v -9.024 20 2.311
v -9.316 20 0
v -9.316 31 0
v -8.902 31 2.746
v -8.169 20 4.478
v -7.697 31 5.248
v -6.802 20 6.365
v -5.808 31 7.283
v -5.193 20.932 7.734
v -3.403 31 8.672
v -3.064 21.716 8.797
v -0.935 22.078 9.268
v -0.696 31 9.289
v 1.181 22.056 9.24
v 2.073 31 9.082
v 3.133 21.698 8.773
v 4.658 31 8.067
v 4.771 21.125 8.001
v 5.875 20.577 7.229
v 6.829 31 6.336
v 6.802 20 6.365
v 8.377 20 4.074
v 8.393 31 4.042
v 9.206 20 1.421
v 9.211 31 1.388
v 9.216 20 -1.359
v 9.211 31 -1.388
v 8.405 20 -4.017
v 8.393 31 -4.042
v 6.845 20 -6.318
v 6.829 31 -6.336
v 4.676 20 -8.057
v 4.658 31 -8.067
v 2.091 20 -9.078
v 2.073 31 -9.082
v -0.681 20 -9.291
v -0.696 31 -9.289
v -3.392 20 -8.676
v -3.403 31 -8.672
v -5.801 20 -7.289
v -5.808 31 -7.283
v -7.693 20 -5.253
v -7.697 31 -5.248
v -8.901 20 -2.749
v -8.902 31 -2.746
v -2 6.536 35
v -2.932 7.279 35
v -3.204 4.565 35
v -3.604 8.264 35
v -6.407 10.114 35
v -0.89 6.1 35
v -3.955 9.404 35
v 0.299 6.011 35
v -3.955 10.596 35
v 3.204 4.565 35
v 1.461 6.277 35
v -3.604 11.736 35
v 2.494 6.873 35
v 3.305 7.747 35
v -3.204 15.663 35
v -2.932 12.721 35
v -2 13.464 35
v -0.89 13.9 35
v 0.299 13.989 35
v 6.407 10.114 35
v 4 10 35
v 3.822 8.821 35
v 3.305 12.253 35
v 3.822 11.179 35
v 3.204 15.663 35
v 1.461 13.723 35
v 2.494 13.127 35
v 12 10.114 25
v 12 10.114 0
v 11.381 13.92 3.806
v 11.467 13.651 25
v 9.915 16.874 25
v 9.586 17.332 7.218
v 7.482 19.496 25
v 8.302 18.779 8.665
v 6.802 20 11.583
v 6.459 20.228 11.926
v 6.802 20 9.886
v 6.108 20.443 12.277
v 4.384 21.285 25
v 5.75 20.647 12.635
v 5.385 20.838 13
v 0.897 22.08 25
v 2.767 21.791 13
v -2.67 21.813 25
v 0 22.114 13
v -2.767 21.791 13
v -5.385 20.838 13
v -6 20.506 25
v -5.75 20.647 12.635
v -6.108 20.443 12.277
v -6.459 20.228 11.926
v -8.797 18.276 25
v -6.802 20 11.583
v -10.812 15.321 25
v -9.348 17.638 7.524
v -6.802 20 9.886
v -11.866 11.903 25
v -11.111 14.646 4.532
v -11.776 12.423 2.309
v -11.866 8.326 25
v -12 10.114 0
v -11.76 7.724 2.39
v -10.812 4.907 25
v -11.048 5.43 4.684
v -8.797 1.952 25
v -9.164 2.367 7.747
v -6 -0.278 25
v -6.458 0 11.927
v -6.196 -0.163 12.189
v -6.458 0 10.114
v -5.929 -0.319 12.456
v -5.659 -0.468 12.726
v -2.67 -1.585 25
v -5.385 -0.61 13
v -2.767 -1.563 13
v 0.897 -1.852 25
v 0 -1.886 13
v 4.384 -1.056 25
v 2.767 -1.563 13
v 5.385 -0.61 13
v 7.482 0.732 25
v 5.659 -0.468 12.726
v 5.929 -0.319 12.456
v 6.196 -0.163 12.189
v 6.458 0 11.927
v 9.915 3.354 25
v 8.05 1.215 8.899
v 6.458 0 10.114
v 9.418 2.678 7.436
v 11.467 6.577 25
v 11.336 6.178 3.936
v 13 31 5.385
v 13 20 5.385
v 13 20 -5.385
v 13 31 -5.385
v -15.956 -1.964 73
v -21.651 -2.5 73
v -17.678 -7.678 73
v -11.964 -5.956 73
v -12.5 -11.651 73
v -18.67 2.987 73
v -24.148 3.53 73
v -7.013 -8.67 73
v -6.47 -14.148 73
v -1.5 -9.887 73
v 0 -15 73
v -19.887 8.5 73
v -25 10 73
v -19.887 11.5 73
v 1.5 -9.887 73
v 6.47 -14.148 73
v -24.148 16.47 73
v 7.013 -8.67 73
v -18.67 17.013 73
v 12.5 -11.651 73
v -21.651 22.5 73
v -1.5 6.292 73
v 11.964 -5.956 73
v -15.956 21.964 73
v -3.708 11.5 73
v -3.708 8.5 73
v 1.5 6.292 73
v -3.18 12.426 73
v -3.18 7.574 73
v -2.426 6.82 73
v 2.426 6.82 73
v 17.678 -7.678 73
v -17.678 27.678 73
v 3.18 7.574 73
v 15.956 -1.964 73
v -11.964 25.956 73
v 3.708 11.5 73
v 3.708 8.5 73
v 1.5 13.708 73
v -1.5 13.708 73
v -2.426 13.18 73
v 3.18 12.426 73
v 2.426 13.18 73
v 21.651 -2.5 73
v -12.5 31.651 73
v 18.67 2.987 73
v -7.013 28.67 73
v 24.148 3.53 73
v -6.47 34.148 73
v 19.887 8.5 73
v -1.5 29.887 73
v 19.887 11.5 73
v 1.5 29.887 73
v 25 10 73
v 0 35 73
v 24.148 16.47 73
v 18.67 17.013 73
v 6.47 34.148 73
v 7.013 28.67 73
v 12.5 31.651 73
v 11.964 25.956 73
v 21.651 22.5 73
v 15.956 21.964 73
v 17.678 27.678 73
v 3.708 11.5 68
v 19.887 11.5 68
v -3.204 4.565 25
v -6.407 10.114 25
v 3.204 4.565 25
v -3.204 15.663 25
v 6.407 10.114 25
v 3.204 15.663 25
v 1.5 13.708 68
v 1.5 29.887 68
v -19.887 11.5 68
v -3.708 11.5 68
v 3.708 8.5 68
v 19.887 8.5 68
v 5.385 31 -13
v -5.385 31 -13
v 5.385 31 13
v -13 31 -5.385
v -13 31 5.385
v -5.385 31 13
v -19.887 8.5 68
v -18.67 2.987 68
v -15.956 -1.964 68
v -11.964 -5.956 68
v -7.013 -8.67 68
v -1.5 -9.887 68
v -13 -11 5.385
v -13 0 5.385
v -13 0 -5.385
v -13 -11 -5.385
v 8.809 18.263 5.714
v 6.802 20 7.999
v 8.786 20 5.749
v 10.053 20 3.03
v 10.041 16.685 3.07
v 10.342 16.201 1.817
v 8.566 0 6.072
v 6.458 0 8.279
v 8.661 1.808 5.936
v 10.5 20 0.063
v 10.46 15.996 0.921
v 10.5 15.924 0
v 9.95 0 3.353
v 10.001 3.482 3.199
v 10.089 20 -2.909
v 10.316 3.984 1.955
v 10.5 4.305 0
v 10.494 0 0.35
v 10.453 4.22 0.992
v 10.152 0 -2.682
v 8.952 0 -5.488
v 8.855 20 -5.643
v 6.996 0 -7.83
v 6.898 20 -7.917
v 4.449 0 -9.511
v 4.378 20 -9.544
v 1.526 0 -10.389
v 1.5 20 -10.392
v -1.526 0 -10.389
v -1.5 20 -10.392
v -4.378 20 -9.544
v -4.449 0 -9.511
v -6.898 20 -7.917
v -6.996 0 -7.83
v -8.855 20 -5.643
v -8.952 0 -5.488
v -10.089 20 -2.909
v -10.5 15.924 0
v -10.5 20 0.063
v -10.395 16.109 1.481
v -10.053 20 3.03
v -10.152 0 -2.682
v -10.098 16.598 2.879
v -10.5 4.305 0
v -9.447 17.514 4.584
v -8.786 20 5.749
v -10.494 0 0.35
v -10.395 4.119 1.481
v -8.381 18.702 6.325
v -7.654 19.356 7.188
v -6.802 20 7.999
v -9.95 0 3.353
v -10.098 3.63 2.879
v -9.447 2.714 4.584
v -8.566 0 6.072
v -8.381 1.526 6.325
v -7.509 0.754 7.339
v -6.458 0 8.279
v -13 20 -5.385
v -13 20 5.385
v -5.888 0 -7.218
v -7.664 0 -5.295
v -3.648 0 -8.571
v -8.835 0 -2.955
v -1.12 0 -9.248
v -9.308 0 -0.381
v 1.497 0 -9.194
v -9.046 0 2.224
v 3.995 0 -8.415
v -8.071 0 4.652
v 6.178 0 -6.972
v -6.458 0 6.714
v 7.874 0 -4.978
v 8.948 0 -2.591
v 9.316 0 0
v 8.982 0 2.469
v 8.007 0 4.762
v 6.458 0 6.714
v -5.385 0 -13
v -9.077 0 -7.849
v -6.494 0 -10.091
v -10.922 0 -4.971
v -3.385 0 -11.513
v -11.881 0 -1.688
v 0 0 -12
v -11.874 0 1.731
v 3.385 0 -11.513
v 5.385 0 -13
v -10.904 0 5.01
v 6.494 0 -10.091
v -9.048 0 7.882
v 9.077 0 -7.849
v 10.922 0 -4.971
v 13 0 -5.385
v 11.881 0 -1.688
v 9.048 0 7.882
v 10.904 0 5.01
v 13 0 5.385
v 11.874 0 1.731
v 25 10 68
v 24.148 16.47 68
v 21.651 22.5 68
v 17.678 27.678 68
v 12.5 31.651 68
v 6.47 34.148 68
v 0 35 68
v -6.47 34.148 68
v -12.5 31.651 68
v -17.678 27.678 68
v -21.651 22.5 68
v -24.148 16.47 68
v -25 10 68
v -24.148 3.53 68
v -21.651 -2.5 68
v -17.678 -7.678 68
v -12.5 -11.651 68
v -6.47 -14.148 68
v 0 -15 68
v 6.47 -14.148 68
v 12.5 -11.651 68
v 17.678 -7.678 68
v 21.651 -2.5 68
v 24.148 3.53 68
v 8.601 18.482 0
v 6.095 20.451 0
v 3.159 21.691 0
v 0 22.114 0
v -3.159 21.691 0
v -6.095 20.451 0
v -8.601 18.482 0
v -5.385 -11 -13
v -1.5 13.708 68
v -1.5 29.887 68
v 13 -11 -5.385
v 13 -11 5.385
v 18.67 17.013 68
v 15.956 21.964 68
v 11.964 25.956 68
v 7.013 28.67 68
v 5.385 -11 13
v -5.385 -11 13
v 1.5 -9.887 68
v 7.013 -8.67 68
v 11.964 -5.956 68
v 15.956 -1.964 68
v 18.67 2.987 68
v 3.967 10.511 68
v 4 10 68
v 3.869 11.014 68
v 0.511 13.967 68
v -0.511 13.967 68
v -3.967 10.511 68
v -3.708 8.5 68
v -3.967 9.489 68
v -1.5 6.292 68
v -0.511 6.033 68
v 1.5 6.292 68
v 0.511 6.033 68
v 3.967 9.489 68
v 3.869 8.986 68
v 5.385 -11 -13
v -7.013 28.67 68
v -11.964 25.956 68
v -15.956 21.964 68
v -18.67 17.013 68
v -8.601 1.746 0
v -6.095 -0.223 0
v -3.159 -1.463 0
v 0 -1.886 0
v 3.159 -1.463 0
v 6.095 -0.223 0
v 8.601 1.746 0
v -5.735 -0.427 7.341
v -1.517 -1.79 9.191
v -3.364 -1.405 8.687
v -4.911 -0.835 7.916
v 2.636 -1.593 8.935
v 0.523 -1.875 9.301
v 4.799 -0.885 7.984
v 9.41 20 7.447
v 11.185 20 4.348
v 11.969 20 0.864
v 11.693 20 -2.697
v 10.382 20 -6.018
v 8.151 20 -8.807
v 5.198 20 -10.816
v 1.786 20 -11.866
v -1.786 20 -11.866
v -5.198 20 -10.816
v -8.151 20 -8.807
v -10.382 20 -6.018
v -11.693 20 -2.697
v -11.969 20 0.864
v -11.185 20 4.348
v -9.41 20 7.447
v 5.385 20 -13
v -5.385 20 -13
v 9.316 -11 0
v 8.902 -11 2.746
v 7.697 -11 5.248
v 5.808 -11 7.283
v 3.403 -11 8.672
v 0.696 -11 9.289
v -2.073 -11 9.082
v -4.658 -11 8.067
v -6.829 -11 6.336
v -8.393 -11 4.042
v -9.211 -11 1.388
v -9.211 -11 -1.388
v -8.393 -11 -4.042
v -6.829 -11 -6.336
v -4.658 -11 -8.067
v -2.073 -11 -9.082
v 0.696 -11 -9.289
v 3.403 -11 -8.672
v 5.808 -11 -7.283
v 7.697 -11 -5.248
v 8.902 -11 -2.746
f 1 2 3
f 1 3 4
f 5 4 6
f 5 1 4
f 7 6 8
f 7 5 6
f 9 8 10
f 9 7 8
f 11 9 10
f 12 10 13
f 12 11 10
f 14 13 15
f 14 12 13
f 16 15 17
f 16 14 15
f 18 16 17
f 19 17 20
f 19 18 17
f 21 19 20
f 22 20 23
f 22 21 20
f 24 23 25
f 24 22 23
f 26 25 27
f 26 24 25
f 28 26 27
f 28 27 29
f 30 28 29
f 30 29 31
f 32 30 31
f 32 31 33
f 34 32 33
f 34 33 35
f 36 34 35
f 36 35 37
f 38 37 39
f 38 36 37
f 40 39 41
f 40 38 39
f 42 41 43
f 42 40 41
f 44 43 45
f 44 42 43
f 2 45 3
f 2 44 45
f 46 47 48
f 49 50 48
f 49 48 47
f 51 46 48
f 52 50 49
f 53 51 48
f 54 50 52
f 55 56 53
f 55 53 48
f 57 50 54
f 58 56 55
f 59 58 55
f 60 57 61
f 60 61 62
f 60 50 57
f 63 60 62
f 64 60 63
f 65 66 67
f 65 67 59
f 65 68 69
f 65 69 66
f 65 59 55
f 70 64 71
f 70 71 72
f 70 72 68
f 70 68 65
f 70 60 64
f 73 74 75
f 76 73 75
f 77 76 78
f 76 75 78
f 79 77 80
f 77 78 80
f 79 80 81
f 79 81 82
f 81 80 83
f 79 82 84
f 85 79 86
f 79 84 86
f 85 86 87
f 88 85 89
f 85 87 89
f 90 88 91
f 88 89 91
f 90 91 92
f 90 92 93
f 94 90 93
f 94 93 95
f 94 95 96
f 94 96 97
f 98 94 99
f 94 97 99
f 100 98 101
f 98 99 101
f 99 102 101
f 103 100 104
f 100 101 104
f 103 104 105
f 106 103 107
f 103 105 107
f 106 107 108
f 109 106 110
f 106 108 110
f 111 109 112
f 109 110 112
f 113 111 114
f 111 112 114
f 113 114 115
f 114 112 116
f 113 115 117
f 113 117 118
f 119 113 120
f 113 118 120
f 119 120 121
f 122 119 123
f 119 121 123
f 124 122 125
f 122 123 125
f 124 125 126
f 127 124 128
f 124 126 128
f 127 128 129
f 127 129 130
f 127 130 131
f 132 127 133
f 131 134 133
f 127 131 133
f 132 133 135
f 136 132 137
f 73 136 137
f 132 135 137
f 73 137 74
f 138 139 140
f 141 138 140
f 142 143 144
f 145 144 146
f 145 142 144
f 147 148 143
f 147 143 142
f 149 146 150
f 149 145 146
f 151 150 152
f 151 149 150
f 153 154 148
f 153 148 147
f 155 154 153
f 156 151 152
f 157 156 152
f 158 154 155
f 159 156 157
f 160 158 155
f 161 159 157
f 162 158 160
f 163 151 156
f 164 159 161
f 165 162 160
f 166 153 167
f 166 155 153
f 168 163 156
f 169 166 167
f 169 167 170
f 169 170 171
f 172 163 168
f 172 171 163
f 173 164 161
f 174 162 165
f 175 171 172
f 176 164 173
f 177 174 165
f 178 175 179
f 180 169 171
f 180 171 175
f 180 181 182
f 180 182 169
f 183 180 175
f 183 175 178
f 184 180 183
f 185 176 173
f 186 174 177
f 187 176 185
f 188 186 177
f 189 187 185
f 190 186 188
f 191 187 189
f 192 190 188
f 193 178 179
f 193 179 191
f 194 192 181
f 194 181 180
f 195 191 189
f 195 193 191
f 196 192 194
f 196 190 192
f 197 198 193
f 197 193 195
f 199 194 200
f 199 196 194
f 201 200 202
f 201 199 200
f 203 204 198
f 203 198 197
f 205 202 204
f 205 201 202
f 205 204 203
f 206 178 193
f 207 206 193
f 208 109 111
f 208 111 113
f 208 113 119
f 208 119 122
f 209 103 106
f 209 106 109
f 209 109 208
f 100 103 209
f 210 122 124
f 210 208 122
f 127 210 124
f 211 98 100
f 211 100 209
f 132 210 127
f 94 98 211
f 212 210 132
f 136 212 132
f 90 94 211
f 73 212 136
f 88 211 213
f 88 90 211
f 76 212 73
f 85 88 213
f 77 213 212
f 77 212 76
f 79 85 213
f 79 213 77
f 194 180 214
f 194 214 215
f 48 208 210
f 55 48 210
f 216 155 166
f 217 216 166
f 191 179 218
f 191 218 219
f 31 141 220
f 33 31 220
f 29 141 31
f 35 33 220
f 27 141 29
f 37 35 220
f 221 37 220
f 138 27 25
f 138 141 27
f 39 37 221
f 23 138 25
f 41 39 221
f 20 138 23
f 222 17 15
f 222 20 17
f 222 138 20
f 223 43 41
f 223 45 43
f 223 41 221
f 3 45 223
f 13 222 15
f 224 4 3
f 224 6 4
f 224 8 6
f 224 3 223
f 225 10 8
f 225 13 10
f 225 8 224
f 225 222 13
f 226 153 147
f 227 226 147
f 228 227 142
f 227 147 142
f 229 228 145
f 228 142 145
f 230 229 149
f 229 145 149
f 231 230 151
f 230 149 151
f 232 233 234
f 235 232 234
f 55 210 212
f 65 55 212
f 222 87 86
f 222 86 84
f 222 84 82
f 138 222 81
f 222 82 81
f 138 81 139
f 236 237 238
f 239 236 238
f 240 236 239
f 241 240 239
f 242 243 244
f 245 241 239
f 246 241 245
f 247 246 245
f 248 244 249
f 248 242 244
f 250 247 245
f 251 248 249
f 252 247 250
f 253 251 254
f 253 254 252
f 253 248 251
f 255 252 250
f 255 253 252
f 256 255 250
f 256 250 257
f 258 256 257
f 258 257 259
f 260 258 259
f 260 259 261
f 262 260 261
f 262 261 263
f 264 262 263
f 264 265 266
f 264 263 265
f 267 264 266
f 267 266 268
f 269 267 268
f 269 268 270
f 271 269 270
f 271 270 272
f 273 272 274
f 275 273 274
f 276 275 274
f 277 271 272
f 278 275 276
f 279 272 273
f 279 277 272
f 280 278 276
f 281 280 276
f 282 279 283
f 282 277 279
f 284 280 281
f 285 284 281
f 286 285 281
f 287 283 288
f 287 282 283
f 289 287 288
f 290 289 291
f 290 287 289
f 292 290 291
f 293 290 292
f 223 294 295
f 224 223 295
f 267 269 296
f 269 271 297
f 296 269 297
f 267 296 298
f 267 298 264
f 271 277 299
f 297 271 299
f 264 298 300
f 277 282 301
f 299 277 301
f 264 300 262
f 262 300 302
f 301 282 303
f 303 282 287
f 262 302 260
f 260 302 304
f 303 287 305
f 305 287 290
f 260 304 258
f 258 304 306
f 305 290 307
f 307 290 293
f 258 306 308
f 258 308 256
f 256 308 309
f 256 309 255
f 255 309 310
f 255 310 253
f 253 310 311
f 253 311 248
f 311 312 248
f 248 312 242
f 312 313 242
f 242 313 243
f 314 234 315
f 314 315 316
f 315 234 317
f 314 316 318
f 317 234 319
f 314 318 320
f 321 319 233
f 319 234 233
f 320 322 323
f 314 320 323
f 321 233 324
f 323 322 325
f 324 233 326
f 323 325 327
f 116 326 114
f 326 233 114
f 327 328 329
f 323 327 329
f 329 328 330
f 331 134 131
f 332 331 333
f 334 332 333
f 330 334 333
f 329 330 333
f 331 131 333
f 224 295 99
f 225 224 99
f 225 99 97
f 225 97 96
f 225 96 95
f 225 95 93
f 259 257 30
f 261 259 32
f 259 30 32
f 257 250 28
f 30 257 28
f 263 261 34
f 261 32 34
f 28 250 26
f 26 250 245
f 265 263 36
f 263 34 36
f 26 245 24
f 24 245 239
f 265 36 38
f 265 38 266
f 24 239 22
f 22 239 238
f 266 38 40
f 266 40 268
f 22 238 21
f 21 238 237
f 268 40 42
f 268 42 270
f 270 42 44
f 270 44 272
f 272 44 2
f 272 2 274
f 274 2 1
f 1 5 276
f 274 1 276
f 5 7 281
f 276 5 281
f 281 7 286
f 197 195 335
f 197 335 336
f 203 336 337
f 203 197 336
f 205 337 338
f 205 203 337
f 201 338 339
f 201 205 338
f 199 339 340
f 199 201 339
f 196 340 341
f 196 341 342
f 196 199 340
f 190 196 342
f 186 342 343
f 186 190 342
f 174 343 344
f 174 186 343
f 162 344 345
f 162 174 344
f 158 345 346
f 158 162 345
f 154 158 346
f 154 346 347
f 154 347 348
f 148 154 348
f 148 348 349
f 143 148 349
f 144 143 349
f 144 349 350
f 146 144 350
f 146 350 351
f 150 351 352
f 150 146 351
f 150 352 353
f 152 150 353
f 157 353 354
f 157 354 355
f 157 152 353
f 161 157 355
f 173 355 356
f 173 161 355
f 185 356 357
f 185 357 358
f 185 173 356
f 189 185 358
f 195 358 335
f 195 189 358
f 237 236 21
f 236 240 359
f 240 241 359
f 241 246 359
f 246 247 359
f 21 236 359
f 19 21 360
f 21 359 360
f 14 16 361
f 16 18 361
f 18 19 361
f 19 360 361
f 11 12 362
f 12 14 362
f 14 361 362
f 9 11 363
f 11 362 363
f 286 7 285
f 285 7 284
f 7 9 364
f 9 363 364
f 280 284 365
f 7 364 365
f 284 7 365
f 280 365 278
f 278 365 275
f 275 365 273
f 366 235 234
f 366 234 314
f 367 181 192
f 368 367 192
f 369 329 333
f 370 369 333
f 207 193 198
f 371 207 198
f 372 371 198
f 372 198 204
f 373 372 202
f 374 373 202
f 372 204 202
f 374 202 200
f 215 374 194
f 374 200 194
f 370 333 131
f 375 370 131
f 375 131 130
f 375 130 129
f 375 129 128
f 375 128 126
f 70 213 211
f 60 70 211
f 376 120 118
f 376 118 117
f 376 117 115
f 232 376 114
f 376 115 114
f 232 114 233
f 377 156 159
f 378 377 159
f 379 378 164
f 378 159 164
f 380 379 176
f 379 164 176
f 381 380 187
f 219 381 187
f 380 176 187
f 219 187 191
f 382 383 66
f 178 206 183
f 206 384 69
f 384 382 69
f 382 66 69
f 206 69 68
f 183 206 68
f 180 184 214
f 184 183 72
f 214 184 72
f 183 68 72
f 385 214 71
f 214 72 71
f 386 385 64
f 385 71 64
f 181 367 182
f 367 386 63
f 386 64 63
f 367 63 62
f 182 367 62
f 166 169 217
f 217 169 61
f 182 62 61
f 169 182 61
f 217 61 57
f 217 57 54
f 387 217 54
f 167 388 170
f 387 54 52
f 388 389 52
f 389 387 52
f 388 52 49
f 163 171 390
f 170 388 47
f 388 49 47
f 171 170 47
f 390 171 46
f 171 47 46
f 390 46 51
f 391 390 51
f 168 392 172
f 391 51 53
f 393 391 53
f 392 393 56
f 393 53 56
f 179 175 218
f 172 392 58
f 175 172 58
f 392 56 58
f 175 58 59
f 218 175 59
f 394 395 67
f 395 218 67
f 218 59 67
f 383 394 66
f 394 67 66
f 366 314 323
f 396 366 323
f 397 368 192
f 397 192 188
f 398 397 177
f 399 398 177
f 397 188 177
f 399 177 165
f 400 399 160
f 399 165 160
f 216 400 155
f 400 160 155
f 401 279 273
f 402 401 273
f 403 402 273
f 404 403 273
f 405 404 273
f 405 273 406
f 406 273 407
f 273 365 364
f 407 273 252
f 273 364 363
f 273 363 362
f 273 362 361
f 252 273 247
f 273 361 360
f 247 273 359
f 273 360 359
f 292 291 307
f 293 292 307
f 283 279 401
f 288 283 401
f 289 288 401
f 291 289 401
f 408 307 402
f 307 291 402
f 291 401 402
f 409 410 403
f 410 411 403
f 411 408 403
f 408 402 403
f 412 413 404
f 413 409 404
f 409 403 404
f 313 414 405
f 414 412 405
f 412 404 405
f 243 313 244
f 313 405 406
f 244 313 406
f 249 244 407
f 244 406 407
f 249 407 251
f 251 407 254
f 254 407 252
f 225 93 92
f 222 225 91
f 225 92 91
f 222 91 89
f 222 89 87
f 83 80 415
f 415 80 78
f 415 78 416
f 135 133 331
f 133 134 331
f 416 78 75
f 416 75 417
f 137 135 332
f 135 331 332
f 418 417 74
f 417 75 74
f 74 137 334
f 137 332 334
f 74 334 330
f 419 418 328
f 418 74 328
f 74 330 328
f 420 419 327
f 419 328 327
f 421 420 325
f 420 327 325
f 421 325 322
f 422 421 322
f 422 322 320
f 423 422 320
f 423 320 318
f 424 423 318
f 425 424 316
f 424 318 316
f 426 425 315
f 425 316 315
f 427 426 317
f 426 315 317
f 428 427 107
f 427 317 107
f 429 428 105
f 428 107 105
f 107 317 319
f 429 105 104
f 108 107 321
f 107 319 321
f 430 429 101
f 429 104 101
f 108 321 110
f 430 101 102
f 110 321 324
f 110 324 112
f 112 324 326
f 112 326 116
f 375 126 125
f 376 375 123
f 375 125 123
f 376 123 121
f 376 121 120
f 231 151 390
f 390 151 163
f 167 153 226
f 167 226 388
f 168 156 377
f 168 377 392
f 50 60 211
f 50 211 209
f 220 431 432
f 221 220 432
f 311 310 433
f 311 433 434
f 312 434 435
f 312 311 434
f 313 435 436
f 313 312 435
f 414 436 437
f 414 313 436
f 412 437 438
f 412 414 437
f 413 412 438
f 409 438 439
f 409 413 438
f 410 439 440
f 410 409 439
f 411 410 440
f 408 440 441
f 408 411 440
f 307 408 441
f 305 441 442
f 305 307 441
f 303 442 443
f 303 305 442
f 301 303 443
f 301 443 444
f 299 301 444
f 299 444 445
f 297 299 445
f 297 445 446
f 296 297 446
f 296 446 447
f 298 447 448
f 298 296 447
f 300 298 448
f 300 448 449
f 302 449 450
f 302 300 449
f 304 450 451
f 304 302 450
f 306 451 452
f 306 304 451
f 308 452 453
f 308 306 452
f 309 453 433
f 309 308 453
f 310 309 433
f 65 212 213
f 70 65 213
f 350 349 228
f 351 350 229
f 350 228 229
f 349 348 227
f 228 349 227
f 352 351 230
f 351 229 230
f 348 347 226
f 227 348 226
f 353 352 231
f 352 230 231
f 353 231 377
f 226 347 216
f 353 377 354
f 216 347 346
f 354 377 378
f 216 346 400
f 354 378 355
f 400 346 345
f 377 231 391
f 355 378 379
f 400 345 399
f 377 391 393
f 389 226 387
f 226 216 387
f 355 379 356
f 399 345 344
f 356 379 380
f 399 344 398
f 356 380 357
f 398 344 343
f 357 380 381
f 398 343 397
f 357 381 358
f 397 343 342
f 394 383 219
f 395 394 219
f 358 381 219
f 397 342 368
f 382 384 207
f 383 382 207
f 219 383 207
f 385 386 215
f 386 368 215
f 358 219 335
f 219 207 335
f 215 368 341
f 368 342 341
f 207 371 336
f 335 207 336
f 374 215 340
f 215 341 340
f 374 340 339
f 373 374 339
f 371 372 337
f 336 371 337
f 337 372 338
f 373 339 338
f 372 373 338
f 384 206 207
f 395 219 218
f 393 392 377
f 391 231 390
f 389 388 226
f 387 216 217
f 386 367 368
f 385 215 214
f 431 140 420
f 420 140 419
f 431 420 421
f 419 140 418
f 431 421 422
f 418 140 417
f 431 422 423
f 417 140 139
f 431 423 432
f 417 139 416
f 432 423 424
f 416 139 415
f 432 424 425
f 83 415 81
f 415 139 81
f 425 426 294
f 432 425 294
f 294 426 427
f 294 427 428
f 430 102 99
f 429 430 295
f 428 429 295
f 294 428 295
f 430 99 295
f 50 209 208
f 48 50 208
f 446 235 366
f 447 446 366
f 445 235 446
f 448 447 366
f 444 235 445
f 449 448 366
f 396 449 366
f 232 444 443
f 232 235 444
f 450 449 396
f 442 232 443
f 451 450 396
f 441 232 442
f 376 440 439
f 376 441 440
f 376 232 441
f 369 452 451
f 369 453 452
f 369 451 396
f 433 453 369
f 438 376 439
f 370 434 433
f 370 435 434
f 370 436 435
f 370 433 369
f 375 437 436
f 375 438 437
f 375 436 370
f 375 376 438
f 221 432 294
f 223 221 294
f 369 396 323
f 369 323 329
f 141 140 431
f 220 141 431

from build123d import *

# Parameters (mm, degrees)
F0_R      = 9.3155
F1_DEPTH  = 11
F2_R      = 12
F2_R_2    = 10.5
F3_DEPTH  = 20
F4_R      = 9.3155
F5_DEPTH  = 11
F6_R      = 12
F7_DEPTH  = 25
F9_DEPTH  = 10
F10_R     = 4
F11_DEPTH = 73
F12_W     = 18.0728212726
F12_H     = 3
F12_W_2   = 18.3906073943
F12_W_3   = 3
F12_H_2   = 17.3976836615
F12_H_3   = 17.163570568
F13_DEPTH = 5
F14_R     = 25
F14_R_2   = 19.9436706752
F15_DEPTH = 5


with BuildPart() as f1:
    # F0 (on Front) → F1 (new body)
    with BuildSketch(Plane.XZ):
        Polygon((13, -5.3847763109), (13, 5.3847763109), (5.3847763109, 13), (-5.3847763109, 13), (-13, 5.3847763109), (-13, -5.3847763109), (-5.3847763109, -13), (5.3847763109, -13), align=None)
        Circle(F0_R, mode=Mode.SUBTRACT)
    extrude(amount=F1_DEPTH)

    # F2 (on face) → F3 (join)
    with BuildSketch(Plane(origin=(0, 0, 0), x_dir=(-1, 0, 0), z_dir=(0, 1, 0))):
        Circle(F2_R)
        Circle(F2_R_2, mode=Mode.SUBTRACT)
    extrude(amount=F3_DEPTH)

    # F4 (on face) → F5 (join)
    with BuildSketch(Plane(origin=(0, 20, 0), x_dir=(-1, 0, 0), z_dir=(0, 1, 0))):
        Polygon((13, -5.3847763109), (13, 5.3847763109), (5.3847763109, 13), (-5.3847763109, 13), (-13, 5.3847763109), (-13, -5.3847763109), (-5.3847763109, -13), (5.3847763109, -13), align=None)
        Circle(F4_R, mode=Mode.SUBTRACT)
    extrude(amount=F5_DEPTH)

    # F6 (on Top) → F7 (join)
    with BuildSketch(Plane.XY):
        with Locations((0, 10.1140267726)):
            Circle(F6_R)
    extrude(amount=F7_DEPTH)

    # F8 (on face) → F9 (join)
    with BuildSketch(Plane.XY.offset(25)):
        Polygon((-3.2036065086, 4.5652175322), (3.2036065086, 4.5652175322), (6.4072130172, 10.1140267726), (3.2036065086, 15.6628360129), (-3.2036065086, 15.6628360129), (-6.4072130172, 10.1140267726), align=None)
    extrude(amount=F9_DEPTH)

    # F10 (on Top) → F11 (join)
    with BuildSketch(Plane.XY):
        with Locations((0, 10)):
            Circle(F10_R)
    extrude(amount=F11_DEPTH)

    # F12 (on face) → F13 (join)
    with BuildSketch(Plane.XY.offset(73)):
        with Locations((-10.9072600389, 10)):
            Rectangle(F12_W, F12_H)
        with Locations((10.748366978, 10)):
            Rectangle(F12_W_2, F12_H)
        with Locations((0, -1.2448288445)):
            Rectangle(F12_W_3, F12_H_2)
        with Locations((0, 21.3618853912)):
            Rectangle(F12_W_3, F12_H_3)
    extrude(amount=-F13_DEPTH)

    # F14 (on face) → F15 (join)
    with BuildSketch(Plane.XY.offset(73)):
        with Locations((0, 10)):
            Circle(F14_R)
        with Locations((0, 10)):
            Circle(F14_R_2, mode=Mode.SUBTRACT)
    extrude(amount=-F15_DEPTH)


solid = f1.part
